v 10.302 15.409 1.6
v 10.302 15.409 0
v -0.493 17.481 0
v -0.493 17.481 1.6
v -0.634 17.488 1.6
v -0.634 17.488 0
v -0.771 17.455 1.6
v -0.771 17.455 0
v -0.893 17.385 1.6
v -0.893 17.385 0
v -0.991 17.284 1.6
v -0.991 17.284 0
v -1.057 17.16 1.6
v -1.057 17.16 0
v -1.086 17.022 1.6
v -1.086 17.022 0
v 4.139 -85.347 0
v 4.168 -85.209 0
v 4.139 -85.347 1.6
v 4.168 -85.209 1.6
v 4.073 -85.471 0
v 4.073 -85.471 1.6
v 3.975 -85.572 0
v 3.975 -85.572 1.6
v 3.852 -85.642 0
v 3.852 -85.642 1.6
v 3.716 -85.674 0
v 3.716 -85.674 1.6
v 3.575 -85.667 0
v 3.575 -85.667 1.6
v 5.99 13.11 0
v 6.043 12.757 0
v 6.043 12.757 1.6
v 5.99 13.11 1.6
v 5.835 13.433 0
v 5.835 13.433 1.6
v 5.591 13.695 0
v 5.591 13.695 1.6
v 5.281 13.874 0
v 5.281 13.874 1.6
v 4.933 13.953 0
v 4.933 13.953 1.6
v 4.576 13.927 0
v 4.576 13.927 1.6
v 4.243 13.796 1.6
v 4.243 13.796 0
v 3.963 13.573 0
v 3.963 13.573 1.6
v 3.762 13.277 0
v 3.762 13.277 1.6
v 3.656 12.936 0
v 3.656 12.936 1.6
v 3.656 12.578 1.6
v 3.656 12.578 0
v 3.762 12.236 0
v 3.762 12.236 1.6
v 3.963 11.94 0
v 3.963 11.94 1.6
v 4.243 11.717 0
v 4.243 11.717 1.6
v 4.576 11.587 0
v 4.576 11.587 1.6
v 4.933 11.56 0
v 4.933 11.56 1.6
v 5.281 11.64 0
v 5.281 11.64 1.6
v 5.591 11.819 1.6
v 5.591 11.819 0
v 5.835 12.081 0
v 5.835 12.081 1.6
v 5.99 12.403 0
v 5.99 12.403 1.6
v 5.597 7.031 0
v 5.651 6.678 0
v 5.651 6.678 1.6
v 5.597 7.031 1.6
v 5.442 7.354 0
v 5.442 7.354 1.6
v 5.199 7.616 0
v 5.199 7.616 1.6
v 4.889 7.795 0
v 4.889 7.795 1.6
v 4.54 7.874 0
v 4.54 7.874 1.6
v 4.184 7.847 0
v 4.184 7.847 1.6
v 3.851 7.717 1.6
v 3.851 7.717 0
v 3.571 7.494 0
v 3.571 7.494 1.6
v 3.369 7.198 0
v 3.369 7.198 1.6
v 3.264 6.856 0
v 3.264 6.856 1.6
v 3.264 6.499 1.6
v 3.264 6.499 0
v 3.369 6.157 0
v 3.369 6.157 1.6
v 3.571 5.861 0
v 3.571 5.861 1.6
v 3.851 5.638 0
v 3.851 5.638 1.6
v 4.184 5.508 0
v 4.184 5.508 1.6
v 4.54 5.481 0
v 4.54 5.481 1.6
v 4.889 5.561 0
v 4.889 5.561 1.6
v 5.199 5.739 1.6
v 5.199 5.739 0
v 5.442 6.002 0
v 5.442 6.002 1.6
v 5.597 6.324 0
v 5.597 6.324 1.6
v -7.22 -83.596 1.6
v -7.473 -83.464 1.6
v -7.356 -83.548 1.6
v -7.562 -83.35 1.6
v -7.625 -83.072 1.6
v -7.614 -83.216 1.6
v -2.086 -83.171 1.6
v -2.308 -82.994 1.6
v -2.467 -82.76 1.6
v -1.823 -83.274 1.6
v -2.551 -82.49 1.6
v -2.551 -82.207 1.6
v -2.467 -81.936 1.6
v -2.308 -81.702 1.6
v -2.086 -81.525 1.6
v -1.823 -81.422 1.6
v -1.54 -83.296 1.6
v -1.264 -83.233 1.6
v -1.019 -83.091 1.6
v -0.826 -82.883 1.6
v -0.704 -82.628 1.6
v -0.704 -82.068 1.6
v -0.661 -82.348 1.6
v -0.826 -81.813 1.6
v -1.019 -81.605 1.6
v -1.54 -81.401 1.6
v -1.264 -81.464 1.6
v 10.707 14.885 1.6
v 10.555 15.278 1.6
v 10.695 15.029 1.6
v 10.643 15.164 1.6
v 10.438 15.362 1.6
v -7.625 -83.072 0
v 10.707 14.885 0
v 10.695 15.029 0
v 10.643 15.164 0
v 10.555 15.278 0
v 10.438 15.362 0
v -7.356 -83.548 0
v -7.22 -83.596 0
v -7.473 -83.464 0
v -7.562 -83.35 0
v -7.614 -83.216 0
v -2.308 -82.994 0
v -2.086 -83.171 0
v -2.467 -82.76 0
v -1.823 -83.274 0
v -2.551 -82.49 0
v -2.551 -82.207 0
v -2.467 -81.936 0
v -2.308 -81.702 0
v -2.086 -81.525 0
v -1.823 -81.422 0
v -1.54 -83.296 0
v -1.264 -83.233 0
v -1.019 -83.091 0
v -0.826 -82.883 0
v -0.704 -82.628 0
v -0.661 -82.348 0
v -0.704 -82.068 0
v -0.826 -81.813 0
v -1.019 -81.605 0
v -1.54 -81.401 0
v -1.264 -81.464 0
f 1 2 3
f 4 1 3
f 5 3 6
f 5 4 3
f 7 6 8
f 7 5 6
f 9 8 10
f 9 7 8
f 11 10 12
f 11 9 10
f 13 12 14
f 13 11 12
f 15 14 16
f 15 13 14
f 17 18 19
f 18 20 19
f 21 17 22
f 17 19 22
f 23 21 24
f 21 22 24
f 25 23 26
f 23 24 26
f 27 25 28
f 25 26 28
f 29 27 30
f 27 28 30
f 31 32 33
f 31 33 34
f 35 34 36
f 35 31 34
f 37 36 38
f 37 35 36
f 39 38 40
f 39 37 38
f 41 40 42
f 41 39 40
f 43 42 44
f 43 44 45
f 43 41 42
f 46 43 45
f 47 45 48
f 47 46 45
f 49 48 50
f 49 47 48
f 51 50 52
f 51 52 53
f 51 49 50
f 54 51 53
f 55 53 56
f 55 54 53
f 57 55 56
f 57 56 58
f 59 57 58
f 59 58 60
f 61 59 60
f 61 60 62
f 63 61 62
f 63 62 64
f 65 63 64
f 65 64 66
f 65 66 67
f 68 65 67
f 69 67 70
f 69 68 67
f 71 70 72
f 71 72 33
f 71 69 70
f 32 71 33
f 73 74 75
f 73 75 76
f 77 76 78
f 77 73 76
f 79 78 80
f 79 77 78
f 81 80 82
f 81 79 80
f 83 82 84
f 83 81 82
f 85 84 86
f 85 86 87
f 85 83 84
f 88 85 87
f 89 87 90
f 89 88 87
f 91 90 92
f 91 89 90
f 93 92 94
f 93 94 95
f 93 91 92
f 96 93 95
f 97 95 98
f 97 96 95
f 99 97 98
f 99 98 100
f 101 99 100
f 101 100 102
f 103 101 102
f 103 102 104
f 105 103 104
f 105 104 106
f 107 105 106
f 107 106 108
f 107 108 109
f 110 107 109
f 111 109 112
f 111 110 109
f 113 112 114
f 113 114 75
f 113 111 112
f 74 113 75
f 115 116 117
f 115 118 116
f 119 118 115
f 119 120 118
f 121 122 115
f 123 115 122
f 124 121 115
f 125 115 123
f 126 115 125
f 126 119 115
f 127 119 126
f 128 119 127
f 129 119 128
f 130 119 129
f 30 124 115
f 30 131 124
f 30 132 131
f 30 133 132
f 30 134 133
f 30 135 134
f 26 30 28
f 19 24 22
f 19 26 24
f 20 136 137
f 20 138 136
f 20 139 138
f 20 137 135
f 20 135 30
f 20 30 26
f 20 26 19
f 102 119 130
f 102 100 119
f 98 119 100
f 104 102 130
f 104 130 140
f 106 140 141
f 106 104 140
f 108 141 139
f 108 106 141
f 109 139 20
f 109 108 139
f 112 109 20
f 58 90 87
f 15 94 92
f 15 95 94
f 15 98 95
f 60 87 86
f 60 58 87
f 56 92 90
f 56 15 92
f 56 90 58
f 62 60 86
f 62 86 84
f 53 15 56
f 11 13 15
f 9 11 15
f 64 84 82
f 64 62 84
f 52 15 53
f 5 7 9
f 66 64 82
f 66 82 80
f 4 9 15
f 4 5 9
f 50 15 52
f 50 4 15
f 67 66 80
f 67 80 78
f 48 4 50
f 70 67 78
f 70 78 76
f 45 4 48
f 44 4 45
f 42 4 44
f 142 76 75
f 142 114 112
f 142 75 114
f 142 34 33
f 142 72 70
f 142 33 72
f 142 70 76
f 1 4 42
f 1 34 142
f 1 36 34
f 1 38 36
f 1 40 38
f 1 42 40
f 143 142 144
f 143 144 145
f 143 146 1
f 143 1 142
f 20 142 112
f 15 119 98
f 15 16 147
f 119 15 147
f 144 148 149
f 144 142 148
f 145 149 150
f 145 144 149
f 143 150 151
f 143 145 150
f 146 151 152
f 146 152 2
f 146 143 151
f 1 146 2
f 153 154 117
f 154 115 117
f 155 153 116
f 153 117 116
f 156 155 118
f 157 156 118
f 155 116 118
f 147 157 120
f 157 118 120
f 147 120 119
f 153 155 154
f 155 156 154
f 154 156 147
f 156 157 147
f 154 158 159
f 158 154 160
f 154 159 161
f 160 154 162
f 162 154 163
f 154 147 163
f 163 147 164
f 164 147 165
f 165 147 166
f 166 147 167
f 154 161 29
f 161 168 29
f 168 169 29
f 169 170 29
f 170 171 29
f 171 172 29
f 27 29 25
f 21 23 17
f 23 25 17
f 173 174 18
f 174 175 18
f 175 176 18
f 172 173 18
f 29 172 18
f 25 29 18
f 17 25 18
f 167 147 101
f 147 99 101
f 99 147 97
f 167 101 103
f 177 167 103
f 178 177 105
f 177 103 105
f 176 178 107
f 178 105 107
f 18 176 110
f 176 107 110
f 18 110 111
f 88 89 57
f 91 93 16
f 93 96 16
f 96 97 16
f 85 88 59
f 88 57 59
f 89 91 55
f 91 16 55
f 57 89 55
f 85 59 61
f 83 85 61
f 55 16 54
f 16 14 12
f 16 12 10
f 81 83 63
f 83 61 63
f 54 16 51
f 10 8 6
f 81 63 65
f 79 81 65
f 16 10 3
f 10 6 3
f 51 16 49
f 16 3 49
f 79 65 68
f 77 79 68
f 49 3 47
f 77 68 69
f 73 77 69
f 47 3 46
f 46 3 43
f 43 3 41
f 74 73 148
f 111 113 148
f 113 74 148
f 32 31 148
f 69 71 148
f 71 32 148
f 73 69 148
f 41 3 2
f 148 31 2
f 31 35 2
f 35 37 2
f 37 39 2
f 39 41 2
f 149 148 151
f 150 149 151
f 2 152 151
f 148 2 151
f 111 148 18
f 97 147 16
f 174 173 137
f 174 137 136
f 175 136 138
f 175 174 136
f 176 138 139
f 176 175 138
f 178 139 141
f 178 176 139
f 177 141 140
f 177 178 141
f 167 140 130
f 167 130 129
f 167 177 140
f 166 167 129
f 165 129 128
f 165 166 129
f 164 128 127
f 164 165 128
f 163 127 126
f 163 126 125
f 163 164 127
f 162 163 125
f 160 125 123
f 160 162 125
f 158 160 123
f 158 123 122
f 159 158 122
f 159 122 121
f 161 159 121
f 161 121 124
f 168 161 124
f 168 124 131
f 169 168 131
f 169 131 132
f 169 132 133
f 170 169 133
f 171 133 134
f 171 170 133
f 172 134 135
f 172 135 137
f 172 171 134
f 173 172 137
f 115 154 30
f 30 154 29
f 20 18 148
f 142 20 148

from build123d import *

# Parameters (mm, degrees)
CROQUIS3_R              = 1.2
CROQUIS3_R_2            = 0.95
SALIENTE_EXTRUIR4_DEPTH = 1.6
REDONDEO4_R             = 0.5
REDONDEO5_R             = 0.5


with BuildPart() as part:
    # Croquis3 → Saliente-Extruir4 (new body)
    with BuildSketch(Plane.XY):
        Polygon((4.131159953, -85.774171861), (10.73555349, 15.325828139), (-1.049372117, 17.587581538), (-7.653765654, -83.512418462), align=None)
        with Locations((4.843090686, 12.756704839)):
            Circle(CROQUIS3_R, mode=Mode.SUBTRACT)
        with Locations((4.450627883, 6.677578183)):
            Circle(CROQUIS3_R, mode=Mode.SUBTRACT)
        with Locations((-1.611374093, -82.348187023)):
            Circle(CROQUIS3_R_2, mode=Mode.SUBTRACT)
    extrude(amount=SALIENTE_EXTRUIR4_DEPTH)

    # Redondeo4
    redondeo4_edges = [part.edges().sort_by_distance(p)[0] for p in [
        (10.73555349, 15.325828139, 0.8),
    ]]
    fillet(redondeo4_edges, radius=REDONDEO4_R)

    # Redondeo5
    redondeo5_edges = [part.edges().sort_by_distance(p)[0] for p in [
        (4.131159953, -85.774171861, 0.8),
        (-7.653765654, -83.512418462, 0.8),
        (-1.049372117, 17.587581538, 0.8),
    ]]
    fillet(redondeo5_edges, radius=REDONDEO5_R)


solid = part.part
